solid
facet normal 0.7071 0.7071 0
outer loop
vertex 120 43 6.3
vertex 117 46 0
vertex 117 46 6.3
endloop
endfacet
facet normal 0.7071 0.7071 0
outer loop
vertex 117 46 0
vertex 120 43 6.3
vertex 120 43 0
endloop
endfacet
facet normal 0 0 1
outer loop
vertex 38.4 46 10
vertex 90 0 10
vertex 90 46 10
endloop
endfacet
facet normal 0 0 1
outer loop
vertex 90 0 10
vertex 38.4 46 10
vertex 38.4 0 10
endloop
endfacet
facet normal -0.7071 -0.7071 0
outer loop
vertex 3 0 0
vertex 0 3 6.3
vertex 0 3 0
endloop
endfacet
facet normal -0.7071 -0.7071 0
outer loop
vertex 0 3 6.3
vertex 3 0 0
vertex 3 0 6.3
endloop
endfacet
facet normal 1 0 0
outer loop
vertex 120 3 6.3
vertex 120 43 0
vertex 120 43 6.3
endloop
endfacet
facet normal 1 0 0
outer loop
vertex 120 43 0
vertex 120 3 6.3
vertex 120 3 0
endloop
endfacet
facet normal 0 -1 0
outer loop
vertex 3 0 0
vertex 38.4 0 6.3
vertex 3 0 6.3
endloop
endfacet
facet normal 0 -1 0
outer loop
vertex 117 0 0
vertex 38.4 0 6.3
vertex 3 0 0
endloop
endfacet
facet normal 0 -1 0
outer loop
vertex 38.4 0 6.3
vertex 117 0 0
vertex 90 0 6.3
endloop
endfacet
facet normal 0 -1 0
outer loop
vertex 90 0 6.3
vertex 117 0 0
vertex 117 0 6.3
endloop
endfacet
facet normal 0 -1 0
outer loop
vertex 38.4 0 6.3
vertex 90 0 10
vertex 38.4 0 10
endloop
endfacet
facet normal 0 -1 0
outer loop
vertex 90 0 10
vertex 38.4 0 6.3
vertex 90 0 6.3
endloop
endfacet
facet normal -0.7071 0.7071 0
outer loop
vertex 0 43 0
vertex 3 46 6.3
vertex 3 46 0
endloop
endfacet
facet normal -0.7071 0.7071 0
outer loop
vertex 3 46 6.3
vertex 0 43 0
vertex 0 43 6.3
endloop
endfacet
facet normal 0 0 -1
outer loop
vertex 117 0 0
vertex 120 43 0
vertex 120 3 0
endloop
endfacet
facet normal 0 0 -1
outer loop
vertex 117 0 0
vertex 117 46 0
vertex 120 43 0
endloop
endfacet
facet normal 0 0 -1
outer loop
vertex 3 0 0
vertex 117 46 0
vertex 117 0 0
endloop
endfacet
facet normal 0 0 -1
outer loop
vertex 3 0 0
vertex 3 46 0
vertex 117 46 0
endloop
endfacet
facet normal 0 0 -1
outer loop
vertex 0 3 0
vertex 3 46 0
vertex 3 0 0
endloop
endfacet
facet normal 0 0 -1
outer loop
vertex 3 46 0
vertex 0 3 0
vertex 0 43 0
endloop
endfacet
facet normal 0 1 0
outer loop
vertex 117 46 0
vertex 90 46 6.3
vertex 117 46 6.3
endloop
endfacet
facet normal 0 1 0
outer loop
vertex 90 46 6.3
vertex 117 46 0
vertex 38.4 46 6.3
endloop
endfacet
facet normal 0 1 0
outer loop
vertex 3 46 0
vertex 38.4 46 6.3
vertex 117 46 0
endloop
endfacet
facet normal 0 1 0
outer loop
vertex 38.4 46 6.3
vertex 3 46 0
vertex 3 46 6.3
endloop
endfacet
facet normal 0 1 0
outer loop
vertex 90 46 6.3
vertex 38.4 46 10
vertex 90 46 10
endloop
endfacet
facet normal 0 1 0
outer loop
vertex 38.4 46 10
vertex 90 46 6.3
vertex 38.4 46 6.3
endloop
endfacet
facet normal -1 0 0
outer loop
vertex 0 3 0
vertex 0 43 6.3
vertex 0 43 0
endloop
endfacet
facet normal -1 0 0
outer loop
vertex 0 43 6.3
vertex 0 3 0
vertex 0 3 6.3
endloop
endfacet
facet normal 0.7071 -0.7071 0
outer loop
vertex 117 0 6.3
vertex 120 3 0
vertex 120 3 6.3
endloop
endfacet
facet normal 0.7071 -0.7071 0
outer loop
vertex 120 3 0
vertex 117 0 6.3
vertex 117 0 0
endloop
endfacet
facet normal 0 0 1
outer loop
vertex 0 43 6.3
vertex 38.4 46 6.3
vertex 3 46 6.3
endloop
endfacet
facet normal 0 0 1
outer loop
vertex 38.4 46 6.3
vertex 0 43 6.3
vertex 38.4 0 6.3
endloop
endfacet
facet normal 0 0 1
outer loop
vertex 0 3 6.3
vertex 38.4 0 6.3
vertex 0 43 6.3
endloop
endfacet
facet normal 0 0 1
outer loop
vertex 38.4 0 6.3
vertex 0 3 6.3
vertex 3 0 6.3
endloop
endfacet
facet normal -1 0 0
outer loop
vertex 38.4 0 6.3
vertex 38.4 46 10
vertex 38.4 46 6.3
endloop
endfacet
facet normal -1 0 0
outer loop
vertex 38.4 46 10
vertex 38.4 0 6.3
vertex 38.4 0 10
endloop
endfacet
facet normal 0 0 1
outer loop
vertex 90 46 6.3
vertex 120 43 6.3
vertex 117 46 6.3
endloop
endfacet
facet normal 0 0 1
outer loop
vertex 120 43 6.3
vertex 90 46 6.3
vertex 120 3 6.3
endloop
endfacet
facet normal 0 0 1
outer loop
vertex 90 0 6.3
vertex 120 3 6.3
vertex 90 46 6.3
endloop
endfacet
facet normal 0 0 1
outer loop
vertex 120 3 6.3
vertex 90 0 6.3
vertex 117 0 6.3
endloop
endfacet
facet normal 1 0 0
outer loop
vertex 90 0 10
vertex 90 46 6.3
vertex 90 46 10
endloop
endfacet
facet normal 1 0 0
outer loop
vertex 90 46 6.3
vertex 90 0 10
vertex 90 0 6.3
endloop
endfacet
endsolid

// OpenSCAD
$fn = 32;

// ----------------------------------------------------------------------
// Stepped bar: centerstep, 120 x 46 x 10/6.3 mm
// ----------------------------------------------------------------------

// --- parameters (mm) ---
bar_l = 120;              // bar length, X
bar_w = 46;               // bar width, Y
plate_t = 10;             // thickness of the thick zone, Z
thin_t = 6.3;             // thickness of the thin zone
corner_c = 3;             // corner chamfer of the bar
step_cut = 3.7;           // material removed from the thin zone
thick_from = 38.4;        // start of the thick middle zone
thick_to = 90;            // end of the thick middle zone
depth_1 = 3.7;            // depth of cut 1 from the top face
depth_2 = 3.7;            // depth of cut 2 from the top face

profile = [[3, 0], [117, 0], [120, 3], [120, 43], [117, 46], [3, 46], [0, 43], [0, 3]];  // primary outline, 8 points, counter clockwise
void_1 = [[-1, -1], [38.4, -1], [38.4, 47], [-1, 47]];  // thin left end, 4 points
void_2 = [[90, -1], [121, -1], [121, 47], [90, 47]];  // thin right end, 4 points

// --- the one profile operation ---
difference() {
  linear_extrude(height = plate_t) polygon(points = profile);
  translate([0, 0, plate_t - depth_1])
    linear_extrude(height = depth_1 + 1) polygon(points = void_1);
  translate([0, 0, plate_t - depth_2])
    linear_extrude(height = depth_2 + 1) polygon(points = void_2);
}
